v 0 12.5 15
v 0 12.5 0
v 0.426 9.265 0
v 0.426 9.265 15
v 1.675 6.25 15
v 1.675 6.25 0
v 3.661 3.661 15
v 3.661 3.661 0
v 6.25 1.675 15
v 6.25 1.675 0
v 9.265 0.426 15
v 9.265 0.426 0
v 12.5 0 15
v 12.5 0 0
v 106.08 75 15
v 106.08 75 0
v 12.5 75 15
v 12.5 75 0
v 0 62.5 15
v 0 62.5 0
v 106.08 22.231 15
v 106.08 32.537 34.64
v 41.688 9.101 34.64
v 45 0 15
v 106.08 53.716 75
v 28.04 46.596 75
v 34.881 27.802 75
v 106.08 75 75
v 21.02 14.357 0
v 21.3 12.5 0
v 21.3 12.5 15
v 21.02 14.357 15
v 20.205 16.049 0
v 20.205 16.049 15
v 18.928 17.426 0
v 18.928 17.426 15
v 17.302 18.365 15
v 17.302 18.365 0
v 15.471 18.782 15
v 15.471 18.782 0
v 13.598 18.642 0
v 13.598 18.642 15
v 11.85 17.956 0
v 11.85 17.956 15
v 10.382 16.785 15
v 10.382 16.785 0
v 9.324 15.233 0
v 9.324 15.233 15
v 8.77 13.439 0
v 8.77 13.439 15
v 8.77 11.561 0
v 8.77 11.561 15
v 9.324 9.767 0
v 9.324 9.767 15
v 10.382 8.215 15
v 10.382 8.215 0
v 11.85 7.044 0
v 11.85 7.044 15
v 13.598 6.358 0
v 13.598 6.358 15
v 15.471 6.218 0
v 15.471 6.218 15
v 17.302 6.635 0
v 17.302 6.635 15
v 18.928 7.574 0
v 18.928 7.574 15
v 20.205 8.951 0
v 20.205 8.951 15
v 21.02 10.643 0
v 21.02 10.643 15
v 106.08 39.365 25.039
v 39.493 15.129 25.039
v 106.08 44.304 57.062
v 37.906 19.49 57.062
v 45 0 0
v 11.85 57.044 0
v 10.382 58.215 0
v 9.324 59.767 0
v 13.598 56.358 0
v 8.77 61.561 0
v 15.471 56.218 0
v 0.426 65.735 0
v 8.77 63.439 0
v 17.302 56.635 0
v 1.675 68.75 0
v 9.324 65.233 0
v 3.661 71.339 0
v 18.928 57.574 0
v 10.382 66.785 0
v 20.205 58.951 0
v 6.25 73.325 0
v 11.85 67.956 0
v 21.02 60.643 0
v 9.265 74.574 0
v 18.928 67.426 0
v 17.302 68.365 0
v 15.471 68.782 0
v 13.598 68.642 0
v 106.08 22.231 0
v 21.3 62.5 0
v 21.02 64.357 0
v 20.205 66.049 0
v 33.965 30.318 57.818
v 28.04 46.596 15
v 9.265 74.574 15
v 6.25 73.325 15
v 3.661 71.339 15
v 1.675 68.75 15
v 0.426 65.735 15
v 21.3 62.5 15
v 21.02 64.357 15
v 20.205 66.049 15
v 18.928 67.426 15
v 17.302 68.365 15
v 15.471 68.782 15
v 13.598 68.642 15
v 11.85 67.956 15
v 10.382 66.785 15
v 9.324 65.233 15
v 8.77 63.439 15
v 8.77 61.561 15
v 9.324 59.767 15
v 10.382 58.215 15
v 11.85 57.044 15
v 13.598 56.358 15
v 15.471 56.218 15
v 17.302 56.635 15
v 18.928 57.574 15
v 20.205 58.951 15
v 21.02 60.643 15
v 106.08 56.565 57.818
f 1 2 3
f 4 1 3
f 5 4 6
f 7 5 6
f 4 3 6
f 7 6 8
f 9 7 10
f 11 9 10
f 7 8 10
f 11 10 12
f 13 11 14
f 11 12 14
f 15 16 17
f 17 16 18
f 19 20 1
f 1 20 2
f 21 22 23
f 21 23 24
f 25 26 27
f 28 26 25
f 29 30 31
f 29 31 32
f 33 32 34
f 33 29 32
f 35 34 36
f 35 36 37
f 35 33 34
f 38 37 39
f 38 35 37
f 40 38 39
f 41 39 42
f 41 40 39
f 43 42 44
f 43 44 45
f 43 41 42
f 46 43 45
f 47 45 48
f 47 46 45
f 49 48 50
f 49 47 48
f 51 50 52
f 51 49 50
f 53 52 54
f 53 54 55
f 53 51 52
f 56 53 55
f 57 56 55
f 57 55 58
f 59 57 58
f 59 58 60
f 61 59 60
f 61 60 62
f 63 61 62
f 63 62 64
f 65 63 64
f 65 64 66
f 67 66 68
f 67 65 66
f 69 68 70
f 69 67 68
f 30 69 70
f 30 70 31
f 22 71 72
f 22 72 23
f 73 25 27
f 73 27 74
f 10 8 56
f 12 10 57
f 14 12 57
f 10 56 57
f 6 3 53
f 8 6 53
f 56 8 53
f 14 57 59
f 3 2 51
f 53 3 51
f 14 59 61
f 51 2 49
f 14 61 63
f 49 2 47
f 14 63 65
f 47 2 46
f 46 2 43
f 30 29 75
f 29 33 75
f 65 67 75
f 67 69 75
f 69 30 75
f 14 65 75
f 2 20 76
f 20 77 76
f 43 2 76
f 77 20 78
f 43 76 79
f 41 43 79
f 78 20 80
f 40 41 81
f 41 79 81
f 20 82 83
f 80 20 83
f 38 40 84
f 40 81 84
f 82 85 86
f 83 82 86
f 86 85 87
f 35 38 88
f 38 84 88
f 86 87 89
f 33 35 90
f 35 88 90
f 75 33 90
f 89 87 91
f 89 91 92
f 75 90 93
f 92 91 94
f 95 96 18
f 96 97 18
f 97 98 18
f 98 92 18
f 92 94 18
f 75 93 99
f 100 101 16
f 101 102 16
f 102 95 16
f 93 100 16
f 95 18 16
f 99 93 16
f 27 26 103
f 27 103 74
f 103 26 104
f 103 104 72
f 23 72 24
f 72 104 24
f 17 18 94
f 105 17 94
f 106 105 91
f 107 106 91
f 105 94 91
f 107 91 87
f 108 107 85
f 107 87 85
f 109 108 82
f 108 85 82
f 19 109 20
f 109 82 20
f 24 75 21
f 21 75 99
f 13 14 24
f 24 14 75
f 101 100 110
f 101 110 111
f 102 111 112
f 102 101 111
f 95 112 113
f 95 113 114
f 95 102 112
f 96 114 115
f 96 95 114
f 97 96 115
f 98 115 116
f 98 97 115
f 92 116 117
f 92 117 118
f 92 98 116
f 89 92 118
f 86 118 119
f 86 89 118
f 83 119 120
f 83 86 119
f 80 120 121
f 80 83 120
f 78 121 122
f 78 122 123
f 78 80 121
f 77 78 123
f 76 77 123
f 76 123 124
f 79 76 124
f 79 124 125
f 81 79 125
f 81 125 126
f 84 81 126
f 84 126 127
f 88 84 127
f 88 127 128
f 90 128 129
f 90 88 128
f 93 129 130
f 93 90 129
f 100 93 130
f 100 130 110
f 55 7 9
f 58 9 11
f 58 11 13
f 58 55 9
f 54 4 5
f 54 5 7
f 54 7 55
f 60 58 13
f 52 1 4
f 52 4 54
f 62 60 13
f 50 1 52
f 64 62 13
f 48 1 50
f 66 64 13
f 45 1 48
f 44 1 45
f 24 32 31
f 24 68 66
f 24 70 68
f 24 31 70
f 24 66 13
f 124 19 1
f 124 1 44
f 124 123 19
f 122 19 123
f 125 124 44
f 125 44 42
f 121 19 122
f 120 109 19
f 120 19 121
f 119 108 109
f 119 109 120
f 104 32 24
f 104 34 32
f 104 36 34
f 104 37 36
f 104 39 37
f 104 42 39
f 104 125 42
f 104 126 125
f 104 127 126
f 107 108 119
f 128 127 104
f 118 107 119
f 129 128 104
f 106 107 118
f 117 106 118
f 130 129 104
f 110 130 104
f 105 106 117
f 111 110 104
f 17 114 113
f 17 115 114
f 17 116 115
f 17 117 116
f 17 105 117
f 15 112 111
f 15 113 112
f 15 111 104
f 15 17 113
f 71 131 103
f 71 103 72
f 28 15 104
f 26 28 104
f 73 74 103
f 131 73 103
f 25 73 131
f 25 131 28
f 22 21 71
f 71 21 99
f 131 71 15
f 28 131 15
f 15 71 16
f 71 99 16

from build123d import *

# Parameters (mm, degrees)
F0_R     = 6.3
F1_DEPTH = 15
F2_DEPTH = 75
F4_DEPTH = 83.0489551508


with BuildPart() as f1:
    # F0 (on Top) → F1 (new body)
    with BuildSketch(Plane.XY):
        with BuildLine():
            Line((0, 62.5), (0, 12.5))
            ThreePointArc((0, 12.5), (3.6611652352, 3.6611652352), (12.5, 0))
            Line((12.5, 0), (45, 0))
            Line((45, 0), (28.0404697245, 46.5959264764))
            Line((28.0404697245, 46.5959264764), (106.0800203511, 75))
            Line((106.0800203511, 75), (12.5, 75))
            ThreePointArc((12.5, 75), (3.6611652352, 71.3388347648), (0, 62.5))
        make_face()
        with Locations((15, 12.5)):
            Circle(F0_R, mode=Mode.SUBTRACT)
        with Locations((15, 62.5)):
            Circle(F0_R, mode=Mode.SUBTRACT)
    extrude(amount=F1_DEPTH)

    # F0 (on Top) → F2 (join)
    with BuildSketch(Plane.XY):
        Polygon((28.0404697245, 46.5959264764), (45, 0), (106.0800203511, 22.2313093162), (106.0800203511, 75), align=None)
    extrude(amount=F2_DEPTH)

    # F3 (on face) → F4 (cut, through all)
    with BuildSketch(Plane(origin=(39.7359999702, 14.4627212179, 0), x_dir=(0.3420201433, -0.9396926208, 0), z_dir=(-0.9396926208, -0.3420201433, 0))):
        Polygon((-0.7092158589, 25.0393128685), (5.70626248, 34.6400925773), (-5.3502404503, 57.0622633677), (-16.8724987437, 57.8178407322), align=None)
        Polygon((5.70626248, 34.6400925773), (15.3909064497, 15), (15.3909064497, 75), (-14.1954427945, 75), (-5.3502404503, 57.0622633677), align=None)
    extrude(amount=-F4_DEPTH, mode=Mode.SUBTRACT)


solid = f1.part
